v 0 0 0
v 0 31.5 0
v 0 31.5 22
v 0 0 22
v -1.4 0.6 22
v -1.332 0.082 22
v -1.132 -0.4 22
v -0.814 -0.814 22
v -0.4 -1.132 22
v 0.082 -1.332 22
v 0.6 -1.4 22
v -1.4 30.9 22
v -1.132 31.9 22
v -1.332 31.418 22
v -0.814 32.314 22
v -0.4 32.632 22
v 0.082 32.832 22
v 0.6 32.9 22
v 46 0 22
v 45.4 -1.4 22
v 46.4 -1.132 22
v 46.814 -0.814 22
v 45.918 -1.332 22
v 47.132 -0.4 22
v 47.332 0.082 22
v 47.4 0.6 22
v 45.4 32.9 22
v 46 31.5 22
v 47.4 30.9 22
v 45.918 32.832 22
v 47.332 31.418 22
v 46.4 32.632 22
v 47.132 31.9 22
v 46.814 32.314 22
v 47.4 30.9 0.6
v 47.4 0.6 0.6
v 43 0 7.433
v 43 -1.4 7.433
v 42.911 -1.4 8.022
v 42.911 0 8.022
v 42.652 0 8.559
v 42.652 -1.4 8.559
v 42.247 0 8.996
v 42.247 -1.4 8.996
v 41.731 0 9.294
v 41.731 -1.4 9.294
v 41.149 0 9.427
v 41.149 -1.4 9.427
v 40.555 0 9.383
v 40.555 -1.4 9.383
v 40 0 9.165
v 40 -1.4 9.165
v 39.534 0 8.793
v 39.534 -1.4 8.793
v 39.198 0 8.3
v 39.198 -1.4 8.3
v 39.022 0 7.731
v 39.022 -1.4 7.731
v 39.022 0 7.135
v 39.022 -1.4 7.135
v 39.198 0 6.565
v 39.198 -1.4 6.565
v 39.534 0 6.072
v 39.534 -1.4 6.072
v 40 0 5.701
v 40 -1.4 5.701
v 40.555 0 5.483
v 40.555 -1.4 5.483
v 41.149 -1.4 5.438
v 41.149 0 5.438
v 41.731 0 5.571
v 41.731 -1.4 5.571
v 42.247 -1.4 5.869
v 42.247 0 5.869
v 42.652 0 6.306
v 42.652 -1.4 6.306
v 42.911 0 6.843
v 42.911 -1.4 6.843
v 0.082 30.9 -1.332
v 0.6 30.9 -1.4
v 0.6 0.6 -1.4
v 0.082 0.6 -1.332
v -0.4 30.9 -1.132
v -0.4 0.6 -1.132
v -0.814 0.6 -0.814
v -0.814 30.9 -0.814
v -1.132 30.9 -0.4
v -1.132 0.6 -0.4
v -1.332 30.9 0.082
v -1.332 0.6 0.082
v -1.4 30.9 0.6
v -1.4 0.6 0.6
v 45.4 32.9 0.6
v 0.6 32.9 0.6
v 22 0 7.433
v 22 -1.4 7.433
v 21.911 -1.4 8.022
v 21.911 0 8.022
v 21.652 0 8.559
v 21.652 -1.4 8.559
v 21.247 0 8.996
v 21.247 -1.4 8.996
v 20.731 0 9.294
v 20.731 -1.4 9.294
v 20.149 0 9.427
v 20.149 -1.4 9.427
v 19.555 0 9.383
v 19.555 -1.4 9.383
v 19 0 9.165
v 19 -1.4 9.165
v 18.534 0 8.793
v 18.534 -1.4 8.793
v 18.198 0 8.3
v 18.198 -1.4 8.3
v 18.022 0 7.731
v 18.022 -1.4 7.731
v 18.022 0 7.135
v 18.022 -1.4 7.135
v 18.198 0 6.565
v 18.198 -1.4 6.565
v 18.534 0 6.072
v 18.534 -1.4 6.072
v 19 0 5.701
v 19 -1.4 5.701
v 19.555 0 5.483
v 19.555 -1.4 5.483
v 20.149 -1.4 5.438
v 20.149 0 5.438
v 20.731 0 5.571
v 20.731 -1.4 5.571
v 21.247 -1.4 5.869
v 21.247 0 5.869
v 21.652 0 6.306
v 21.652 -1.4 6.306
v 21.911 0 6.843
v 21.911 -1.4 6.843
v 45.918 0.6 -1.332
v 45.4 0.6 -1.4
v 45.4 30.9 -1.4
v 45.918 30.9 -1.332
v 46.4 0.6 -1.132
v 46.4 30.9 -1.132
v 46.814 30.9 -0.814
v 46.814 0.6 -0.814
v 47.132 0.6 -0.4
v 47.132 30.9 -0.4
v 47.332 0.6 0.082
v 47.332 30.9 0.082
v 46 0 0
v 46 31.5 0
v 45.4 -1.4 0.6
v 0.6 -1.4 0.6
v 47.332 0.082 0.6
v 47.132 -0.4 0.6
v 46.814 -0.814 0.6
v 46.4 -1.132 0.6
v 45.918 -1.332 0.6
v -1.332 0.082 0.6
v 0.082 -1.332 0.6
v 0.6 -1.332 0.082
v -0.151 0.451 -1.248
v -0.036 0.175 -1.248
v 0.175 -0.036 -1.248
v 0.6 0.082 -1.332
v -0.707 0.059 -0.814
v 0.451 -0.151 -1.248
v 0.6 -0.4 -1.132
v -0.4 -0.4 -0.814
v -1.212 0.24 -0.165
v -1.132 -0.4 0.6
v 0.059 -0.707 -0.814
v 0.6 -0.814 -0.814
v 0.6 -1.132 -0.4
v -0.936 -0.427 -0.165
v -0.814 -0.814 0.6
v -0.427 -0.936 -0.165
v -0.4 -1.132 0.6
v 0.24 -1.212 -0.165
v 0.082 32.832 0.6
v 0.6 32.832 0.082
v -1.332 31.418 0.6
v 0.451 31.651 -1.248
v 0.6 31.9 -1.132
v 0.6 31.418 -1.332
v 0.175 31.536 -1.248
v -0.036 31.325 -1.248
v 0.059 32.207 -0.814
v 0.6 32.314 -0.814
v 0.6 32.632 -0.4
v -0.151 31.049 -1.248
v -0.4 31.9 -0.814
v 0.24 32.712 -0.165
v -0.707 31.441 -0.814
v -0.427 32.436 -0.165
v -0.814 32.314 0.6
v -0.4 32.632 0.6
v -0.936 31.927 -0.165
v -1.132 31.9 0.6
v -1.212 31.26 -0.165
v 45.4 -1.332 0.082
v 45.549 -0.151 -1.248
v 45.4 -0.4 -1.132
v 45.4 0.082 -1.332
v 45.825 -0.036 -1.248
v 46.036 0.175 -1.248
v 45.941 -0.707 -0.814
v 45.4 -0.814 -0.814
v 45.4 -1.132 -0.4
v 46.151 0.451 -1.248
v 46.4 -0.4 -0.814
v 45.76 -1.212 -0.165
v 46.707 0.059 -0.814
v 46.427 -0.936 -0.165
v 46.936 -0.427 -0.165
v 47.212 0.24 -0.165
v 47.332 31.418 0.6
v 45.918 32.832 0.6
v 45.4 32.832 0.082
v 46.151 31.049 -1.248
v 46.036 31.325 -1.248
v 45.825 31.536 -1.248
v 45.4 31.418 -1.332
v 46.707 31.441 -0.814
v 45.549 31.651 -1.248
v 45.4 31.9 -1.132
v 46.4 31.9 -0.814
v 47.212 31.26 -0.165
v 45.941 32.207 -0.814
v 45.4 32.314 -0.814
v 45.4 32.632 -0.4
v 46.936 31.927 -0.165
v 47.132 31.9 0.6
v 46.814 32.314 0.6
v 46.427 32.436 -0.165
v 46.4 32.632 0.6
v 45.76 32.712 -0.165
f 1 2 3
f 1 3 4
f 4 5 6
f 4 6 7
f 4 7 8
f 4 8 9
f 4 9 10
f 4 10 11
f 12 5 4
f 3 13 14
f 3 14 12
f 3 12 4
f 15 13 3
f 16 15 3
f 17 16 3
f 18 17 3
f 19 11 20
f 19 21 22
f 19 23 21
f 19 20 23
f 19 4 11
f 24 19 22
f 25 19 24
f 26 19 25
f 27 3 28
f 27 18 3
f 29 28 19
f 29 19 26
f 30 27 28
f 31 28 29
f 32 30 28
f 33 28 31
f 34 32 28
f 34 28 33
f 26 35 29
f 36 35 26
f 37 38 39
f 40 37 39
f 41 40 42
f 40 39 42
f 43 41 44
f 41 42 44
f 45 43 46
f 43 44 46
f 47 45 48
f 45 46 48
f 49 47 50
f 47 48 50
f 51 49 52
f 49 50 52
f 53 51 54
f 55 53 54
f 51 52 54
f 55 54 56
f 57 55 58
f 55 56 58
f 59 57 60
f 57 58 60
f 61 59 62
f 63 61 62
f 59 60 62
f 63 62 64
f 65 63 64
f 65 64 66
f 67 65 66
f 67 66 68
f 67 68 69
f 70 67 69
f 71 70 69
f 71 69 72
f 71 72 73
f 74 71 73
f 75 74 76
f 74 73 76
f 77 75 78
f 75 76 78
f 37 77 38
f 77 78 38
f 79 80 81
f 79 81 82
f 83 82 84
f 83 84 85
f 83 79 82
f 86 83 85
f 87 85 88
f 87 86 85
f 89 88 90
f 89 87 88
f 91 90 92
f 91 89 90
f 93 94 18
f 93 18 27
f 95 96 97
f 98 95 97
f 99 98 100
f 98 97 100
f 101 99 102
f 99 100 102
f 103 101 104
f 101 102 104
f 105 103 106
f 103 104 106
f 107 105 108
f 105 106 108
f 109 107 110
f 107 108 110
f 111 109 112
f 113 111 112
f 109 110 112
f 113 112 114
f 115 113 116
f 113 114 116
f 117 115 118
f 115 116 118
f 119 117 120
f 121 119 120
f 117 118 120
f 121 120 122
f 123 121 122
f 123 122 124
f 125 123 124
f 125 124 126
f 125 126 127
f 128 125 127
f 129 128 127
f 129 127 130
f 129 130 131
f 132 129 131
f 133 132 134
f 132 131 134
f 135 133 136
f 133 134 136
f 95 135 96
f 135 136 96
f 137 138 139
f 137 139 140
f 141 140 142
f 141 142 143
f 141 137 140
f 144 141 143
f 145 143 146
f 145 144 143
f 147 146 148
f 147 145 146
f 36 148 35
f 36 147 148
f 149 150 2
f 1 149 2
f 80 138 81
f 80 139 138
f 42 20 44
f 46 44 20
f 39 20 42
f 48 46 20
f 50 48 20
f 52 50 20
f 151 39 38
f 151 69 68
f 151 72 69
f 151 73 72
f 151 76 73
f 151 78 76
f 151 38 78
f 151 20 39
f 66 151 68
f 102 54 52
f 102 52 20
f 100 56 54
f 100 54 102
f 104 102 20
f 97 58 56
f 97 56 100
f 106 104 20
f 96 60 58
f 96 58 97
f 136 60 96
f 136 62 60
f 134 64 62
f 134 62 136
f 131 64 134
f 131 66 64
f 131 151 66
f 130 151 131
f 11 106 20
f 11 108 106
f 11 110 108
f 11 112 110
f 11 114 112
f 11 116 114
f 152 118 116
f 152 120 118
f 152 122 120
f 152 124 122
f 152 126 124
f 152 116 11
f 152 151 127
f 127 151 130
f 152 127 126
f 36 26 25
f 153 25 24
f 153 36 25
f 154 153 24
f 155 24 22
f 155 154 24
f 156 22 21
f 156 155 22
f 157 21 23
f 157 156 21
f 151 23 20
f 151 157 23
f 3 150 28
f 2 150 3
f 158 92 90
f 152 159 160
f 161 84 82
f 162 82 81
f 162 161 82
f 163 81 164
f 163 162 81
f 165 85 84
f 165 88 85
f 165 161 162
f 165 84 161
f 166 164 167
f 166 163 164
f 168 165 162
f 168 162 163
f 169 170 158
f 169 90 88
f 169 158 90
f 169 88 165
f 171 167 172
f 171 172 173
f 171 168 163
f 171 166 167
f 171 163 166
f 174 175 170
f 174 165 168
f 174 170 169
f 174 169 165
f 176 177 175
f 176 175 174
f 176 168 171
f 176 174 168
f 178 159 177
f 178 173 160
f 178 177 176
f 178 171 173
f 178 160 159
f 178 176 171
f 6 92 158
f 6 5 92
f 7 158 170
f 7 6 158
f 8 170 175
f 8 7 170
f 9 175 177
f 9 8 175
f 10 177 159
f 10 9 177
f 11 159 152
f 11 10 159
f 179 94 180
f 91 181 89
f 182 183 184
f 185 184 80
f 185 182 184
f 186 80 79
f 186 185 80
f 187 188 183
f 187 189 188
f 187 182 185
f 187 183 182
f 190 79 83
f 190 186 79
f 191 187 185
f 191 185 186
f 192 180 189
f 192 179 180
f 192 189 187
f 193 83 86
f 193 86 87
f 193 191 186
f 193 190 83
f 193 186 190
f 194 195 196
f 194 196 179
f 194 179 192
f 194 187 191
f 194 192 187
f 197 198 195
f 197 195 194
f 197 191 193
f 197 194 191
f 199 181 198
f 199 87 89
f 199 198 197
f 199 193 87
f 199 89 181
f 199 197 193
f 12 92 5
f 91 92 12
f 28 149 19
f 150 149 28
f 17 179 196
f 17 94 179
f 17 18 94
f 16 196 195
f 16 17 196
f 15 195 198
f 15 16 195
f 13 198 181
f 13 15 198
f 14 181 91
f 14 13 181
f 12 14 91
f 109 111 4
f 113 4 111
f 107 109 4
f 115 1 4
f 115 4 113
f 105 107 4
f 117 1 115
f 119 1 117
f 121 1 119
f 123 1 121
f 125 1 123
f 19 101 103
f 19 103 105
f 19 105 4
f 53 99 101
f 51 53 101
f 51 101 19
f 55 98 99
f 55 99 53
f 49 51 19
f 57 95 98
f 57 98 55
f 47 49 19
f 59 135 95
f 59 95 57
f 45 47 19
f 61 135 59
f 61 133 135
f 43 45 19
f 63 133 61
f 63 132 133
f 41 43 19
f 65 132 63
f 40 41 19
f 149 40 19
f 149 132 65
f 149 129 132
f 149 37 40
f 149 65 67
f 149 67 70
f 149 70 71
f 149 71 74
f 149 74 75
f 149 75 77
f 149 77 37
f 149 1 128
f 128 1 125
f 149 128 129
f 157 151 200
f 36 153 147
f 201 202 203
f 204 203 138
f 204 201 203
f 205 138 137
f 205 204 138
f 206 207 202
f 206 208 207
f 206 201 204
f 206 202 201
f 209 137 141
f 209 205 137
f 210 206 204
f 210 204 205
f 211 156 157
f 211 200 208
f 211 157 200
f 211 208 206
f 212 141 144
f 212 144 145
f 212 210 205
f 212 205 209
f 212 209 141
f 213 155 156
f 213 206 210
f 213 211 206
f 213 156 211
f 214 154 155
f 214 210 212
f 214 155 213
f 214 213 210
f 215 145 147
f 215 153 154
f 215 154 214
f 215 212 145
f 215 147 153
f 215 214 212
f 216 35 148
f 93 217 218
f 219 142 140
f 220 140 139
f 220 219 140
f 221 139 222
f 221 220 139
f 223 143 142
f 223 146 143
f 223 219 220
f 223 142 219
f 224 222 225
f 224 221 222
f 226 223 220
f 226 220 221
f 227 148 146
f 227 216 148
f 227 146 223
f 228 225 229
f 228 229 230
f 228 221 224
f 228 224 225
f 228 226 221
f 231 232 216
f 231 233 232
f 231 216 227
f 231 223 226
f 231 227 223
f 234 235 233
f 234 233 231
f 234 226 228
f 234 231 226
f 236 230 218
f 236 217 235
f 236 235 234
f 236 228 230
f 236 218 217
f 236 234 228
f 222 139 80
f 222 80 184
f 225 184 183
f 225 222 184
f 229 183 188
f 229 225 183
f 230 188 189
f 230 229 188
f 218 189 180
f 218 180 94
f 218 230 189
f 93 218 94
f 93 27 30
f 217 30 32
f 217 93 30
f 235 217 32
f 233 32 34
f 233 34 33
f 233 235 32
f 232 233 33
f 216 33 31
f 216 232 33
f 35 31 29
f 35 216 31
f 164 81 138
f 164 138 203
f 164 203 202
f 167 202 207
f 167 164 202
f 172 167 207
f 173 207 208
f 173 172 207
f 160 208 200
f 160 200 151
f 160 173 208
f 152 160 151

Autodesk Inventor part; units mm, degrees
ref_plane "YZ Plane" through (0, 0, 0) normal (1, 0, 0) x (0, 1, 0)
ref_plane "XZ Plane" through (0, 0, 0) normal (0, 1, 0) x (-1, 0, 0)
ref_plane "XY Plane" through (0, 0, 0) normal (0, 0, 1) x (1, 0, 0)
sketch "Sketch1" plane through (0, 0, 0) normal (0, 0, 1) x (1, 0, 0)
  line L0 (0, 0) -> (46, 0)
  line L1 (46, 0) -> (46, 31.5)
  line L2 (46, 31.5) -> (0, 31.5)
  line L3 (0, 31.5) -> (0, 0)
  line L4 (-1.4, 32.9) -> (47.4, 32.9)
  line L5 (47.4, 32.9) -> (47.4, -1.4)
  line L6 (47.4, -1.4) -> (-1.4, -1.4)
  line L7 (-1.4, -1.4) -> (-1.4, 32.9)
  dimension "d0" = 46
  dimension "d1" = 31.5
  dimension "d2" = 1.4
extrude "Extrusion1" add sketch "Sketch1" along normal blind 22
sketch "Sketch2" plane through (0, 0, 0) normal (0, 0, -1) x (-1, 0, 0)
  line L0 (1.4, -1.4) -> (1.4, 32.9) projected
  line L1 (-47.4, -1.4) -> (1.4, -1.4) projected
  line L2 (1.4, 32.9) -> (-47.4, 32.9) projected
  line L3 (-47.4, 32.9) -> (-47.4, -1.4) projected
  point P0 (0, 0)
extrude "Extrusion2" add sketch "Sketch2" along normal blind 1.4
sketch "Sketch3" plane through (-1.4, -1.4, 22) normal (0, -1, 0) x (1, 0, 0)
  circle A0 centre (21.4, -14.5673) radius 2
  line L0 (1.4, -22) -> (1.4, 0) projected
  circle A1 centre (42.4, -14.5673) radius 2
  line L1 (47.4, -22) -> (47.4, 0) projected
  dimension "d7" = 4
  dimension "d8" = 20
  dimension "d9" = 4
  dimension "d10" = 5
extrude "Extrusion3" cut sketch "Sketch3" against normal blind 1.4
fillet "Fillet1" radius 2 8 edges at (-1.4, -1.4, 10.3) (47.4, -1.4, 10.3) (47.4, 32.9, 10.3) (-1.4, 32.9, 10.3) (47.4, 15.75, -1.4) (23, -1.4, -1.4) (-1.4, 15.75, -1.4) (23, 32.9, -1.4)
properties part number "relay-housing"
